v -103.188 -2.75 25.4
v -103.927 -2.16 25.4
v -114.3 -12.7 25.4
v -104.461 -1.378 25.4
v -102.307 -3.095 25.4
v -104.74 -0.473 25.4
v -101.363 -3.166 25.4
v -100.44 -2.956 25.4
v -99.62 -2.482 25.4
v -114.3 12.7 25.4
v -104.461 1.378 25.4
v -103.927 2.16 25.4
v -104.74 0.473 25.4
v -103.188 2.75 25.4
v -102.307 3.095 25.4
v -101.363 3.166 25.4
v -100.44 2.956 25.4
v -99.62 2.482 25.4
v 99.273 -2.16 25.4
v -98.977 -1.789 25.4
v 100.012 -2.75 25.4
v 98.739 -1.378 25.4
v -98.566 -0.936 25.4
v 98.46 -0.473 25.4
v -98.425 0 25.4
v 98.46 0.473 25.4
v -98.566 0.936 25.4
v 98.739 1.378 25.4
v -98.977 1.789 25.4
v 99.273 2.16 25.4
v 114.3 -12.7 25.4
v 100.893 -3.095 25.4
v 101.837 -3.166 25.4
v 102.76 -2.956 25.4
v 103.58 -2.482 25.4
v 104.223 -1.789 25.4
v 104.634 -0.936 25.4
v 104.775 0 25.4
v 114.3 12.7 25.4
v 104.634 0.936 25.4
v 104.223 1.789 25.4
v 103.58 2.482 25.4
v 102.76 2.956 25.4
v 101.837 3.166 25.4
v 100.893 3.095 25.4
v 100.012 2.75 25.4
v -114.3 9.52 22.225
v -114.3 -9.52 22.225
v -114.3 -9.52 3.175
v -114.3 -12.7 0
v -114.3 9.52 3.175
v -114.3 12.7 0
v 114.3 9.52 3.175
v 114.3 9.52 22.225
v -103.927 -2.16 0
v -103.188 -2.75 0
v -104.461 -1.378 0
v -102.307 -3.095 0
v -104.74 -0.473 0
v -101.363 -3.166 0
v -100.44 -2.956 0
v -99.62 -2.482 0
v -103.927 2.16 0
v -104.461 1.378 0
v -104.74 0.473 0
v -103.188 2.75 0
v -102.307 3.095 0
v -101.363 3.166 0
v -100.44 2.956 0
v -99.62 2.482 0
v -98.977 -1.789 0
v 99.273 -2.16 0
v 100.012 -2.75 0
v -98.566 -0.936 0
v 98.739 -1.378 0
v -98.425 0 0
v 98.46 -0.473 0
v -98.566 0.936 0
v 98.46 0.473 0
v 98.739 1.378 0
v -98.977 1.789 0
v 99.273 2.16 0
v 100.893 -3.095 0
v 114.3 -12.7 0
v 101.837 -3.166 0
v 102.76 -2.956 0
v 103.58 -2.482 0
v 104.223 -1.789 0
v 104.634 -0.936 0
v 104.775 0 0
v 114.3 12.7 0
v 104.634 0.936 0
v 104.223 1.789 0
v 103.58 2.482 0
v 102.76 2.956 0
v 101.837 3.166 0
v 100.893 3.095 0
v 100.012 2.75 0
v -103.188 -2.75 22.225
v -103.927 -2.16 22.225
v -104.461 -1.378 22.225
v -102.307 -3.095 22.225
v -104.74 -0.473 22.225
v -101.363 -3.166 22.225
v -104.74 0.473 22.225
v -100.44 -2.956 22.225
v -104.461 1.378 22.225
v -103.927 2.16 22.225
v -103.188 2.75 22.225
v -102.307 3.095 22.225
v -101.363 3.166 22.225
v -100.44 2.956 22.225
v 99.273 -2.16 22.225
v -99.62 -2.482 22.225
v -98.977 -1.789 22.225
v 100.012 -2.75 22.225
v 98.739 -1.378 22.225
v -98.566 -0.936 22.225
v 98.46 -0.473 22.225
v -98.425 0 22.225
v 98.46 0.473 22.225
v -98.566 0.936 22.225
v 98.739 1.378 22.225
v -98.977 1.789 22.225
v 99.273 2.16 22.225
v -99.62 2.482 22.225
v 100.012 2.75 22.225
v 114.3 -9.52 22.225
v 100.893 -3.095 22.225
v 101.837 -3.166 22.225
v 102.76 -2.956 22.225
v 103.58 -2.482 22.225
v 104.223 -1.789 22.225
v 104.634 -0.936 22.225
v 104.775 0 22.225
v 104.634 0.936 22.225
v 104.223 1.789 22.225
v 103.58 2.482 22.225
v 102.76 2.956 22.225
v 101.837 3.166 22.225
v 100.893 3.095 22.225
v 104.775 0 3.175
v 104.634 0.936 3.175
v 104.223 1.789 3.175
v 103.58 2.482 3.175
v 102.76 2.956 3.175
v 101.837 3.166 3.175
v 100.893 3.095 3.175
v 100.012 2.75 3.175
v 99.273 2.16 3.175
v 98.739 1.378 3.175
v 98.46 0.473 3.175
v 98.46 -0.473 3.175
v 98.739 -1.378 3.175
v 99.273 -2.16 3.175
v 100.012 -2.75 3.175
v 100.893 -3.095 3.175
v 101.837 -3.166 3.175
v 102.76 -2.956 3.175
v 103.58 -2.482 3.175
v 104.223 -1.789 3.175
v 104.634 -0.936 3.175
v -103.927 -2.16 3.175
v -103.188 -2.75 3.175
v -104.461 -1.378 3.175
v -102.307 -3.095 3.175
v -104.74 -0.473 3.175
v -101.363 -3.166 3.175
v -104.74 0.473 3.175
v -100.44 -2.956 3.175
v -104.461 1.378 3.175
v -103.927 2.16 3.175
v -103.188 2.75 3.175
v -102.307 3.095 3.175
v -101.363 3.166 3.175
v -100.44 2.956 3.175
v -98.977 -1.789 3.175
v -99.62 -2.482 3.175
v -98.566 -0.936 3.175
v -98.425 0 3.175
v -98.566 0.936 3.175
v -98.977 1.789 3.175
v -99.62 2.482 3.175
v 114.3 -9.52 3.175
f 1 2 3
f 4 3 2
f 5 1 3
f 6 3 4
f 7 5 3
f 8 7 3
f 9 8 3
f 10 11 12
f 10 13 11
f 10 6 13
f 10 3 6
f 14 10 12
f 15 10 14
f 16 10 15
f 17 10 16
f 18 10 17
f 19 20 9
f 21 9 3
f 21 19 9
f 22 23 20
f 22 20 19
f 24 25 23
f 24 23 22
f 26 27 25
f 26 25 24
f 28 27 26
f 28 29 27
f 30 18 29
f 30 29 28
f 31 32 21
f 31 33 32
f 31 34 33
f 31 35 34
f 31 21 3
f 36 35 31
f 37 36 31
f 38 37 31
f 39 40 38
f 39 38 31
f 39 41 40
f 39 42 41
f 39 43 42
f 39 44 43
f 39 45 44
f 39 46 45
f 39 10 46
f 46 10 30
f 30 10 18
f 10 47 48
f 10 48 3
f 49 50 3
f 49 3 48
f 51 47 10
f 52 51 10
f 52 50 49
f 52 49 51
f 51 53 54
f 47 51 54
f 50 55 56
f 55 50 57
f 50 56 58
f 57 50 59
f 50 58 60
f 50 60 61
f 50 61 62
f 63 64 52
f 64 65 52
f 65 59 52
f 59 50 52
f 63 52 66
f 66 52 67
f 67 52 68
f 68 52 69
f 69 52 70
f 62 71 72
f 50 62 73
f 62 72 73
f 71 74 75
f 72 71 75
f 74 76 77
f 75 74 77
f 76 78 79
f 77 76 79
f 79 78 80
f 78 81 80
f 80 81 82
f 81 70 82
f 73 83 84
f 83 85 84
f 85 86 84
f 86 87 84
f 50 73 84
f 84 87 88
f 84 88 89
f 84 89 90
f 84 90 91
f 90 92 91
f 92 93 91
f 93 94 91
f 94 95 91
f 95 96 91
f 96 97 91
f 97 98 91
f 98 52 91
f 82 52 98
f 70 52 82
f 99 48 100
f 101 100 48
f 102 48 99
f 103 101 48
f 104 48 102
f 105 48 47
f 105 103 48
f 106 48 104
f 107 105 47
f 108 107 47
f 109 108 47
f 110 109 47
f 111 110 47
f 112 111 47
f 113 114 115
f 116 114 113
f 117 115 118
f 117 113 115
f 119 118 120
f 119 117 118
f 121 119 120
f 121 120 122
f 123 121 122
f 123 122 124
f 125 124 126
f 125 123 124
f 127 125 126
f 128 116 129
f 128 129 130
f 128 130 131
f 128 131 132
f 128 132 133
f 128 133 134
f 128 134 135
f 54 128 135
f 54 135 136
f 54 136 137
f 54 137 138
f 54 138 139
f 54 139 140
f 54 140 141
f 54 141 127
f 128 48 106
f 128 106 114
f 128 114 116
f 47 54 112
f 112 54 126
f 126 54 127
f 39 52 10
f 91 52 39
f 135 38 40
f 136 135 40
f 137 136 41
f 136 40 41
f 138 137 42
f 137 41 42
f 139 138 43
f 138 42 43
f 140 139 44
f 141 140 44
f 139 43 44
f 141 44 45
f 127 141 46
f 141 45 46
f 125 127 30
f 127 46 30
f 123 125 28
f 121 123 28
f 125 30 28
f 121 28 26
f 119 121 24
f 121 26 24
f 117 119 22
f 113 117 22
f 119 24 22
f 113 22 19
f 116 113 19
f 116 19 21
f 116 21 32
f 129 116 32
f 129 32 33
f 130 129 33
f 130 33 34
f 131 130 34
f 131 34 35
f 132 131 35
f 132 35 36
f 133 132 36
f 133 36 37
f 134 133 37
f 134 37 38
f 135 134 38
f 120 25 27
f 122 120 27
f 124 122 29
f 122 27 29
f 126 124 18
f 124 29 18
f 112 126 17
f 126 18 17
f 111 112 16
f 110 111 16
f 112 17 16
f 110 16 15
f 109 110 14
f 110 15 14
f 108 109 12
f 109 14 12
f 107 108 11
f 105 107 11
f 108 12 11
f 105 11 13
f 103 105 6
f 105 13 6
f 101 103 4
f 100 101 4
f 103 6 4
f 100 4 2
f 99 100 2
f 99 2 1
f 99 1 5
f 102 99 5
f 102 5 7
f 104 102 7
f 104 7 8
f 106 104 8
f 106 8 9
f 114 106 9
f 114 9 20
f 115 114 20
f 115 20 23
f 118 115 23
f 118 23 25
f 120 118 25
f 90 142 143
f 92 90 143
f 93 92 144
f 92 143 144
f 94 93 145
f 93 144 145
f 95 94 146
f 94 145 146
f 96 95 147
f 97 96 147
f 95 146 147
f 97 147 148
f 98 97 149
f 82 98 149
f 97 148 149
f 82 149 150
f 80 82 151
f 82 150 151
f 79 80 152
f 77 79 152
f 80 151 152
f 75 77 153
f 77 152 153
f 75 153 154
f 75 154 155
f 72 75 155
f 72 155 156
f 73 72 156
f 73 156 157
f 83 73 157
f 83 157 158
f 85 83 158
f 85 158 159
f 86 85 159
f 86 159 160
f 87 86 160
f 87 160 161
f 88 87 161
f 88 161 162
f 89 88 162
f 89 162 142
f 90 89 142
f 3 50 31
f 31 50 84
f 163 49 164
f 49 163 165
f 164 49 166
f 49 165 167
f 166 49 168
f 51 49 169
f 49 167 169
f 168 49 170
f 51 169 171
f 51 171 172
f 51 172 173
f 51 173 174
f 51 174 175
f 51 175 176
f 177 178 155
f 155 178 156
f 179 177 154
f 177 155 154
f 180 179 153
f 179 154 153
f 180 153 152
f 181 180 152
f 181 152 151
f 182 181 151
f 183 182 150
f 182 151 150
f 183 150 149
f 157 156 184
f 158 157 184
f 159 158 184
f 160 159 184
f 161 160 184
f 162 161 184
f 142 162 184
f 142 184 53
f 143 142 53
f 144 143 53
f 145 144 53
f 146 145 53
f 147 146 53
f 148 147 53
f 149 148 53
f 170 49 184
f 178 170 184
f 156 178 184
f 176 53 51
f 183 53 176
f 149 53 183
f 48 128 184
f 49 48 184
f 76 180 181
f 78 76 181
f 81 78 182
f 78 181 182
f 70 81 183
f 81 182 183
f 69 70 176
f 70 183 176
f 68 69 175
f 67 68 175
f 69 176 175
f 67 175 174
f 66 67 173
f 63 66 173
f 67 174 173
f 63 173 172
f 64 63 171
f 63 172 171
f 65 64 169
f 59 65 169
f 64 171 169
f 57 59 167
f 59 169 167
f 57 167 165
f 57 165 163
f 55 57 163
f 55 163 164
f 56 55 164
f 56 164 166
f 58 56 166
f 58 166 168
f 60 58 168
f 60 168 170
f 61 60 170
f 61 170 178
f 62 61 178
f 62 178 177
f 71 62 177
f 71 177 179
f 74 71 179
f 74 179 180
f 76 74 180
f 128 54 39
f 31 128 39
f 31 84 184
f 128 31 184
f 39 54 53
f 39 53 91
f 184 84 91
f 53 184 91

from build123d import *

# Parameters (mm, degrees)
SKETCH1_W           = 228.6
SKETCH1_H           = 25.4
BOSS_EXTRUDE1_DEPTH = 25.4
SKETCH2_W           = 9.525
SKETCH2_H           = 19.040717284
CUT_EXTRUDE1_DEPTH  = 508
SKETCH4_R           = 3.175
CUT_EXTRUDE3_DEPTH  = 508


with BuildPart() as part:
    # Sketch1 → Boss-Extrude1 (new body)
    with BuildSketch(Plane.XY):
        Rectangle(SKETCH1_W, SKETCH1_H)
    extrude(amount=BOSS_EXTRUDE1_DEPTH)

    # Sketch2 → Cut-Extrude1 (cut)
    with BuildSketch(Plane(origin=(114.3, 0, 0), x_dir=(0, 0, -1), z_dir=(1, 0, 0))):
        with Locations((-17.4625, 0)):
            Rectangle(SKETCH2_W, SKETCH2_H)
        with Locations((-7.9375, 0)):
            Rectangle(SKETCH2_W, SKETCH2_H)
    extrude(amount=-CUT_EXTRUDE1_DEPTH, mode=Mode.SUBTRACT)

    # Sketch4 → Cut-Extrude3 (cut)
    with BuildSketch(Plane.XY.offset(25.4)):
        with Locations((-101.6, 0)):
            Circle(SKETCH4_R)
        with Locations((101.6, 0)):
            Circle(SKETCH4_R)
    extrude(amount=-CUT_EXTRUDE3_DEPTH, mode=Mode.SUBTRACT)


solid = part.part
